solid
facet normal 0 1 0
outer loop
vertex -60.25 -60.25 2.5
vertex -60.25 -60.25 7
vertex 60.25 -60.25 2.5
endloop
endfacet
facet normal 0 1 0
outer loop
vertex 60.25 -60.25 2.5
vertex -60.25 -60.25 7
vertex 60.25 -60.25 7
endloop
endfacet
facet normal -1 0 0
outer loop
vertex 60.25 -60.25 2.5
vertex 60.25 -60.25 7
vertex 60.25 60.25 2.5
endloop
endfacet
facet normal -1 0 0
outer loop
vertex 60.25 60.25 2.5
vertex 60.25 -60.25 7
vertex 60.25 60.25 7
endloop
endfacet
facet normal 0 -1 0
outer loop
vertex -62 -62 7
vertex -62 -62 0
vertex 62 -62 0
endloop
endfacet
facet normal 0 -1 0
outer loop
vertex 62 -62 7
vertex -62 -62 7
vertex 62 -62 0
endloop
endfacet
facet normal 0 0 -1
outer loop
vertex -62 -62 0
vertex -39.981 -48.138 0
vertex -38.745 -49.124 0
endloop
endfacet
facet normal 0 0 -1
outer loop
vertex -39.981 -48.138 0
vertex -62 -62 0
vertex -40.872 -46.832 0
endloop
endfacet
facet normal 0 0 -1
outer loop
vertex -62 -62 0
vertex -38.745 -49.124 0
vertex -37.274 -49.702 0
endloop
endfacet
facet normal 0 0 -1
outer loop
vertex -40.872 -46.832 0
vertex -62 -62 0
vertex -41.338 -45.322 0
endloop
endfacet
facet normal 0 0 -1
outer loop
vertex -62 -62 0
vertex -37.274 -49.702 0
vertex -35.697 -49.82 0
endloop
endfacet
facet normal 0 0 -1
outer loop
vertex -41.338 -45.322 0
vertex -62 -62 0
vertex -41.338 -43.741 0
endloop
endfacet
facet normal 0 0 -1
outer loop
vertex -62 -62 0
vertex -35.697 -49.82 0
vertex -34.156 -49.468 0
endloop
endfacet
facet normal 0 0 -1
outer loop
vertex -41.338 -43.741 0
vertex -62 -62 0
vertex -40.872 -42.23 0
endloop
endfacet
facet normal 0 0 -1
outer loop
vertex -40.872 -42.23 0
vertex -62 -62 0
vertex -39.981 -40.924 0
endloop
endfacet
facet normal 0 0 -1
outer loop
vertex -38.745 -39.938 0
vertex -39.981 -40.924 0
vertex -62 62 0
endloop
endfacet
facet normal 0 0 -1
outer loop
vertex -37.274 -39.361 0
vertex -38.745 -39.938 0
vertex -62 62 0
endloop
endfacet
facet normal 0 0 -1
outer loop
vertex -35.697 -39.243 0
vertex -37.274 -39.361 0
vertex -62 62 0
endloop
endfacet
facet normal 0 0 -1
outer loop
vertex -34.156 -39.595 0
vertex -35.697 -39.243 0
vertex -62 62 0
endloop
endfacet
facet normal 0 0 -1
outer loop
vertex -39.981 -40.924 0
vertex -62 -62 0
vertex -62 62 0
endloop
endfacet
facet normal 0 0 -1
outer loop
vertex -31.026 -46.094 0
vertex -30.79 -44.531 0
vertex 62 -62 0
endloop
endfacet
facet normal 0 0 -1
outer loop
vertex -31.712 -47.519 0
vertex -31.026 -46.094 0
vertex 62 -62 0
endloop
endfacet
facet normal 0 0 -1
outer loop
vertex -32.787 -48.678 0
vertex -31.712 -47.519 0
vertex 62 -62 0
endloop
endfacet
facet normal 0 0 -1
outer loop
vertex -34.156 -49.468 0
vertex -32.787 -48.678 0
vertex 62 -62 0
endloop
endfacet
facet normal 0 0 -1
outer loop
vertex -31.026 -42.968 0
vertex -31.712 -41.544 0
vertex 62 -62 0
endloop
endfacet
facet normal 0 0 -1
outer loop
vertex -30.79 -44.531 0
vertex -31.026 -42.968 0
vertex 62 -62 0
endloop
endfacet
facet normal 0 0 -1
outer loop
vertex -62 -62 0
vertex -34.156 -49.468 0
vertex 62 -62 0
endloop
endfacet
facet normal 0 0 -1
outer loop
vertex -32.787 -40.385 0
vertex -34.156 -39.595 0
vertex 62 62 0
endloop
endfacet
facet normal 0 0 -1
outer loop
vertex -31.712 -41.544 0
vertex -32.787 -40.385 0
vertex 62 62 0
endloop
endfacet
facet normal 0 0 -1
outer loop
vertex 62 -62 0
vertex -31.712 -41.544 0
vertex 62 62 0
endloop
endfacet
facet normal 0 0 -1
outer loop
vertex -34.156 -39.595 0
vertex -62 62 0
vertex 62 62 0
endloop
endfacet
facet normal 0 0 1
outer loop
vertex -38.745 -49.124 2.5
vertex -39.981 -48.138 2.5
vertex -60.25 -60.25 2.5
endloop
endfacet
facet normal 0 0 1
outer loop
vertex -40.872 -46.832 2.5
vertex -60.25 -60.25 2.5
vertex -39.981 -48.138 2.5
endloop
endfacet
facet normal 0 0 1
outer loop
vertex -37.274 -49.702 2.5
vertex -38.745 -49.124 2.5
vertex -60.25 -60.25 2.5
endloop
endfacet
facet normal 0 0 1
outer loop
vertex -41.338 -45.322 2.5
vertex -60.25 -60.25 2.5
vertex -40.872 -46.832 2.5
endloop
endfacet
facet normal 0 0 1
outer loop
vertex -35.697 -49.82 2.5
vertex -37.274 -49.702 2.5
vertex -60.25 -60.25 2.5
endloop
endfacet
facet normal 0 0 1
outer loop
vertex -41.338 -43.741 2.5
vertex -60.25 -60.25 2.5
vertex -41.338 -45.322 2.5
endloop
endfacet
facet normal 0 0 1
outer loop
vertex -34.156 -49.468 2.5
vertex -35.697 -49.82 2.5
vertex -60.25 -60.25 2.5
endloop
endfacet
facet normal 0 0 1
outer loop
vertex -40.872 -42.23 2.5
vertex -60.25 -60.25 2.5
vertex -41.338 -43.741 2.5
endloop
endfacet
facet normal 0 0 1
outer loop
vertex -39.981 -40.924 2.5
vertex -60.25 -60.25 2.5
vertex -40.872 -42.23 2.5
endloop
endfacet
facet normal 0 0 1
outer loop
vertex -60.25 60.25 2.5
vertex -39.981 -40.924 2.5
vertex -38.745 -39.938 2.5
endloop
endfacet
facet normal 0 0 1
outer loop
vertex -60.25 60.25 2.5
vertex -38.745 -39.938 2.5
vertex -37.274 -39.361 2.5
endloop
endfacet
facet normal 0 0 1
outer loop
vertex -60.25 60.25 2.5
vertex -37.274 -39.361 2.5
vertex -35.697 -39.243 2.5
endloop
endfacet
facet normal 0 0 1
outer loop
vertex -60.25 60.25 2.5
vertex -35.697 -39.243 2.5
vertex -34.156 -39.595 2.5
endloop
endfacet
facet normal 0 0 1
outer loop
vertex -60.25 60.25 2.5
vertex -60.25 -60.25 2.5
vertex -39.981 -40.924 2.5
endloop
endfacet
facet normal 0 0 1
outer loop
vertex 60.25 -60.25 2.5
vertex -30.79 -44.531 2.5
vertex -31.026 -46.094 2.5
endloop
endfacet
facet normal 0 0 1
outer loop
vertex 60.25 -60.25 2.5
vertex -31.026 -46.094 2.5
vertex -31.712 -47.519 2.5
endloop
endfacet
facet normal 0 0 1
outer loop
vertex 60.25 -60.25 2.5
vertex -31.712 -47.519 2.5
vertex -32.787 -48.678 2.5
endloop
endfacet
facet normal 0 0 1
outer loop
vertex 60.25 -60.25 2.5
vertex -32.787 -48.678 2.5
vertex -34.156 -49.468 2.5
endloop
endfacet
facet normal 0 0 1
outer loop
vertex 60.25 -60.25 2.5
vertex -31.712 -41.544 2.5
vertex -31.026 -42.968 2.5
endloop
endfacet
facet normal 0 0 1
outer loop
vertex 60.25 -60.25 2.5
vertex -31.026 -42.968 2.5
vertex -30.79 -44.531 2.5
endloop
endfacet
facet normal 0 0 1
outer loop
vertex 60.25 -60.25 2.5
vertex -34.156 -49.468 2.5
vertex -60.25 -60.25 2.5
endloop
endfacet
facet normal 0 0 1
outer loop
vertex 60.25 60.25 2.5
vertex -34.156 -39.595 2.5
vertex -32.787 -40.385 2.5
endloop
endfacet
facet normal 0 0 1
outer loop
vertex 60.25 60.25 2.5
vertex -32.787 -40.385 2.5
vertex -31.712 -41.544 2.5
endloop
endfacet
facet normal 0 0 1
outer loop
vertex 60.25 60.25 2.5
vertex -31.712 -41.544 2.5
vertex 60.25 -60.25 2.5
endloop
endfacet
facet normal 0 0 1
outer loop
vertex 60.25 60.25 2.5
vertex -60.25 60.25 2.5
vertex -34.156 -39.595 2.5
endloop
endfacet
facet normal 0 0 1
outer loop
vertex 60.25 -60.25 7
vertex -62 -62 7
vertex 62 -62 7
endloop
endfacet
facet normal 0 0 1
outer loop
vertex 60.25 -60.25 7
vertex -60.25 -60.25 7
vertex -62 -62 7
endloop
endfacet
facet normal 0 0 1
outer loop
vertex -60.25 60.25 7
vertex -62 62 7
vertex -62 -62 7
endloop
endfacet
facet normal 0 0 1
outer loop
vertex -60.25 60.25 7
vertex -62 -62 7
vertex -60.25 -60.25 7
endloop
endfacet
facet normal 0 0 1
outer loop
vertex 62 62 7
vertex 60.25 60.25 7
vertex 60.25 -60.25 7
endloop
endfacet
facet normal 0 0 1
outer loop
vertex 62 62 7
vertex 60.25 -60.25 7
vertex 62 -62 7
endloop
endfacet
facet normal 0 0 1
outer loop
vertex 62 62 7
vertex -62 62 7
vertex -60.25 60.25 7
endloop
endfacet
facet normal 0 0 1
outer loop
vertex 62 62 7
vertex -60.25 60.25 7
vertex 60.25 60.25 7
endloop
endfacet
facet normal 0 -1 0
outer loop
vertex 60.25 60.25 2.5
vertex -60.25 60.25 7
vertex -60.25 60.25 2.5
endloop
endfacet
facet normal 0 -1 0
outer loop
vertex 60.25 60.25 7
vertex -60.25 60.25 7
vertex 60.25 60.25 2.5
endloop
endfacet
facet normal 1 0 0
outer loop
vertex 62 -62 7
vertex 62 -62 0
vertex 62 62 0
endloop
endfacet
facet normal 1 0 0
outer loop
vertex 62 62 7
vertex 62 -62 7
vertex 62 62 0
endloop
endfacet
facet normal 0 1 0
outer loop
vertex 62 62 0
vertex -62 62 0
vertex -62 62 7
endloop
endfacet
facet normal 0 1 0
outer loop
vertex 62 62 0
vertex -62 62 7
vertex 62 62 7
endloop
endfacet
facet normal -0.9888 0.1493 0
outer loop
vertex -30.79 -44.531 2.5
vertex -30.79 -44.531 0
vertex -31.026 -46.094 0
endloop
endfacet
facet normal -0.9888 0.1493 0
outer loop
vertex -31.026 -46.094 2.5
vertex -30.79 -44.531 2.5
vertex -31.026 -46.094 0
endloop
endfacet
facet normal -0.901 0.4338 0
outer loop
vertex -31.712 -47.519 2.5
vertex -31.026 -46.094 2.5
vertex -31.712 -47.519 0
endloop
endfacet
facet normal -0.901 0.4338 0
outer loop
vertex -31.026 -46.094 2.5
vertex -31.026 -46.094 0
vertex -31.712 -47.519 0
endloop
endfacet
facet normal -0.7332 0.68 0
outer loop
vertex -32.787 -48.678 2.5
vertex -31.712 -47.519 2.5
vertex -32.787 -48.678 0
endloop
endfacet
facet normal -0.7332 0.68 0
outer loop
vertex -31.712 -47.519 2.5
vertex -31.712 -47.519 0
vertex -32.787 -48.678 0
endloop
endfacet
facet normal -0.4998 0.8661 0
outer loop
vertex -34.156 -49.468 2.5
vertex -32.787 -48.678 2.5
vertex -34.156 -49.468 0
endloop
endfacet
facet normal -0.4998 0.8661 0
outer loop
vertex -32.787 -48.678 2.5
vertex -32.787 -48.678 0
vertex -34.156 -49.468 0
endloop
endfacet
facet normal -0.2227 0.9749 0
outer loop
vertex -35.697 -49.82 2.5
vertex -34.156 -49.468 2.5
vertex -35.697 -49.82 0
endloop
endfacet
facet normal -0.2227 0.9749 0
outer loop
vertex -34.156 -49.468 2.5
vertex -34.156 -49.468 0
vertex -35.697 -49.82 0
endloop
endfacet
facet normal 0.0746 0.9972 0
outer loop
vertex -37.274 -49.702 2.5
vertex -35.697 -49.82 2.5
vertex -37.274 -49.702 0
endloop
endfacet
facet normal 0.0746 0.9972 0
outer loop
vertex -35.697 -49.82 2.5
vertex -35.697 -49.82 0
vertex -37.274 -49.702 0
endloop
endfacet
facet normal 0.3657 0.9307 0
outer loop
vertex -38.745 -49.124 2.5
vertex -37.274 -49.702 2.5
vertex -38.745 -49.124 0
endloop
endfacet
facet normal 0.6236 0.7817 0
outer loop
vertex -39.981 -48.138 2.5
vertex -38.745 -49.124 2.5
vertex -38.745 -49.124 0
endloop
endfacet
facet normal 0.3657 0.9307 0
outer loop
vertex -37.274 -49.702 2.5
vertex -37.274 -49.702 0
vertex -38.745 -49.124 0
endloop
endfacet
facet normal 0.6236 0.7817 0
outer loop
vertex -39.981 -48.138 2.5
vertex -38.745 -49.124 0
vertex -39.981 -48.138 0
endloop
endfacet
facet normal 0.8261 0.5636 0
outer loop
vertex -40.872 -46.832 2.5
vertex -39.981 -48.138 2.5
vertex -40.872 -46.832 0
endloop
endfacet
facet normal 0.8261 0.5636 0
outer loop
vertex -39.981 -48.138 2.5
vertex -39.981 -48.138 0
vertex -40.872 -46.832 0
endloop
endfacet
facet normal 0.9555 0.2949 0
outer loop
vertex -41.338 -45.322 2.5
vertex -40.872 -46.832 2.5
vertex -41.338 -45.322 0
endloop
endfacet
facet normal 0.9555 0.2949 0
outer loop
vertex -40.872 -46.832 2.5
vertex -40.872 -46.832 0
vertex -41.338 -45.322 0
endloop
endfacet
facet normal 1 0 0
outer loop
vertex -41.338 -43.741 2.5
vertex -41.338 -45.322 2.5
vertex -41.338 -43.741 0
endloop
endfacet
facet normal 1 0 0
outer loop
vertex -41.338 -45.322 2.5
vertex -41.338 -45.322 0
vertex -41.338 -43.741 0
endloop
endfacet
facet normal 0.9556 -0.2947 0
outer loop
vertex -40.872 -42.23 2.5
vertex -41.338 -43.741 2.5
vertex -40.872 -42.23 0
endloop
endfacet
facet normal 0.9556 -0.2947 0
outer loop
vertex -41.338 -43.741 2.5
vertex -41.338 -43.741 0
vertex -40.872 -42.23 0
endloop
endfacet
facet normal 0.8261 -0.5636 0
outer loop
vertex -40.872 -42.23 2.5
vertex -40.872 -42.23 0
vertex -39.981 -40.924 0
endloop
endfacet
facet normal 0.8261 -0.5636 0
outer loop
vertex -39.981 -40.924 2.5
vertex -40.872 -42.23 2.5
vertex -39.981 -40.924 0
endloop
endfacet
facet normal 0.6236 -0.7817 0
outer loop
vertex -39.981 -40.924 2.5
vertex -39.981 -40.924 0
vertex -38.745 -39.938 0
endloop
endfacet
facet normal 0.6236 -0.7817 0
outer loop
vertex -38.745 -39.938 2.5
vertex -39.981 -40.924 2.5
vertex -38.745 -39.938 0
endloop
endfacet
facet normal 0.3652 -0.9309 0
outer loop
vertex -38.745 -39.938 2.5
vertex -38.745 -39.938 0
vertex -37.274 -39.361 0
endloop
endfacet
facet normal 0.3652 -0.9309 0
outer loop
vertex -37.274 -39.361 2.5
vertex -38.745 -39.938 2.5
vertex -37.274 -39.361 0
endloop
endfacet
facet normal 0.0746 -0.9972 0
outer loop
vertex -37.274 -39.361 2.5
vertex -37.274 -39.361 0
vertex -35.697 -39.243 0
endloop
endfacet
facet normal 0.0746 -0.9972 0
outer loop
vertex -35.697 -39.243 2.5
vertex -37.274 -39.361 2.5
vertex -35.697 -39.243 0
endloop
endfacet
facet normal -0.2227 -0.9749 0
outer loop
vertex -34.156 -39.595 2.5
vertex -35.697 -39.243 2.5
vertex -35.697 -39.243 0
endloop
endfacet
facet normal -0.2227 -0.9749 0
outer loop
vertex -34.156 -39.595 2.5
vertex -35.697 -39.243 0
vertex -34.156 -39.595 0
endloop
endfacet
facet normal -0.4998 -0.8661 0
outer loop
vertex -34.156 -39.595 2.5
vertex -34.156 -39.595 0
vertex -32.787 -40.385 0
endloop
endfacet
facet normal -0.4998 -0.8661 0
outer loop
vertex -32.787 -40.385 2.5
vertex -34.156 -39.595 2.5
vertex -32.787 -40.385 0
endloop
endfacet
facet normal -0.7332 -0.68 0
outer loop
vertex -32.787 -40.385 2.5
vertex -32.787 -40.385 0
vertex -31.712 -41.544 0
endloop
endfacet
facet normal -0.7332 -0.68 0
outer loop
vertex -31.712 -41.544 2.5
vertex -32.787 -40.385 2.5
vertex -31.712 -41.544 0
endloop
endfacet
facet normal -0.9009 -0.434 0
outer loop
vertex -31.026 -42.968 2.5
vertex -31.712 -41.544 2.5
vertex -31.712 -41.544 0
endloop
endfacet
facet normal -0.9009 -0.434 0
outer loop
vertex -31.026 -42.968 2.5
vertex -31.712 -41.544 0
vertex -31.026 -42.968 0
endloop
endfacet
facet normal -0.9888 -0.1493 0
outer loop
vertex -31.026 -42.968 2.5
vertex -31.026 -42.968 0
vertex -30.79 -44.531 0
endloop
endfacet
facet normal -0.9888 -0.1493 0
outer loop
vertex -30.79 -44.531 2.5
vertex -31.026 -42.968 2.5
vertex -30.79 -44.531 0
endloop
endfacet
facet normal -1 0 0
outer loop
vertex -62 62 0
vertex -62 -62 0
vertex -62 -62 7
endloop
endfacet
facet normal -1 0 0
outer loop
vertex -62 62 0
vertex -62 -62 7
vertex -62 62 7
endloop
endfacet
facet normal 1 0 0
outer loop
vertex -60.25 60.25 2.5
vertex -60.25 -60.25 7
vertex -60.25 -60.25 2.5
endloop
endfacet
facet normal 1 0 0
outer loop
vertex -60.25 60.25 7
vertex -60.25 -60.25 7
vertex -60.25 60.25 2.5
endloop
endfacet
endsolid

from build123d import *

# Parameters (mm, degrees)
F0_W     = 124
F0_H     = 124
F1_DEPTH = 7
F2_W     = 120.5
F2_H     = 120.5
F3_DEPTH = 4.5
F4_R     = 5.303301
F5_DEPTH = 7.001


with BuildPart() as f1:
    # F0 (on Top) → F1 (new body)
    with BuildSketch(Plane.XY):
        Rectangle(F0_W, F0_H)
    extrude(amount=F1_DEPTH)

    # F2 (on face) → F3 (cut)
    with BuildSketch(Plane.XY.offset(7)):
        Rectangle(F2_W, F2_H)
    extrude(amount=-F3_DEPTH, mode=Mode.SUBTRACT)

    # F4 (on face) → F5 (cut, through all)
    with BuildSketch(Plane(origin=(0, 0, 0), x_dir=(1, 0, 0), z_dir=(0, 0, -1))):
        with Locations((-36.093753, 44.531252)):
            Circle(F4_R)
    extrude(amount=-F5_DEPTH, mode=Mode.SUBTRACT)


solid = f1.part
